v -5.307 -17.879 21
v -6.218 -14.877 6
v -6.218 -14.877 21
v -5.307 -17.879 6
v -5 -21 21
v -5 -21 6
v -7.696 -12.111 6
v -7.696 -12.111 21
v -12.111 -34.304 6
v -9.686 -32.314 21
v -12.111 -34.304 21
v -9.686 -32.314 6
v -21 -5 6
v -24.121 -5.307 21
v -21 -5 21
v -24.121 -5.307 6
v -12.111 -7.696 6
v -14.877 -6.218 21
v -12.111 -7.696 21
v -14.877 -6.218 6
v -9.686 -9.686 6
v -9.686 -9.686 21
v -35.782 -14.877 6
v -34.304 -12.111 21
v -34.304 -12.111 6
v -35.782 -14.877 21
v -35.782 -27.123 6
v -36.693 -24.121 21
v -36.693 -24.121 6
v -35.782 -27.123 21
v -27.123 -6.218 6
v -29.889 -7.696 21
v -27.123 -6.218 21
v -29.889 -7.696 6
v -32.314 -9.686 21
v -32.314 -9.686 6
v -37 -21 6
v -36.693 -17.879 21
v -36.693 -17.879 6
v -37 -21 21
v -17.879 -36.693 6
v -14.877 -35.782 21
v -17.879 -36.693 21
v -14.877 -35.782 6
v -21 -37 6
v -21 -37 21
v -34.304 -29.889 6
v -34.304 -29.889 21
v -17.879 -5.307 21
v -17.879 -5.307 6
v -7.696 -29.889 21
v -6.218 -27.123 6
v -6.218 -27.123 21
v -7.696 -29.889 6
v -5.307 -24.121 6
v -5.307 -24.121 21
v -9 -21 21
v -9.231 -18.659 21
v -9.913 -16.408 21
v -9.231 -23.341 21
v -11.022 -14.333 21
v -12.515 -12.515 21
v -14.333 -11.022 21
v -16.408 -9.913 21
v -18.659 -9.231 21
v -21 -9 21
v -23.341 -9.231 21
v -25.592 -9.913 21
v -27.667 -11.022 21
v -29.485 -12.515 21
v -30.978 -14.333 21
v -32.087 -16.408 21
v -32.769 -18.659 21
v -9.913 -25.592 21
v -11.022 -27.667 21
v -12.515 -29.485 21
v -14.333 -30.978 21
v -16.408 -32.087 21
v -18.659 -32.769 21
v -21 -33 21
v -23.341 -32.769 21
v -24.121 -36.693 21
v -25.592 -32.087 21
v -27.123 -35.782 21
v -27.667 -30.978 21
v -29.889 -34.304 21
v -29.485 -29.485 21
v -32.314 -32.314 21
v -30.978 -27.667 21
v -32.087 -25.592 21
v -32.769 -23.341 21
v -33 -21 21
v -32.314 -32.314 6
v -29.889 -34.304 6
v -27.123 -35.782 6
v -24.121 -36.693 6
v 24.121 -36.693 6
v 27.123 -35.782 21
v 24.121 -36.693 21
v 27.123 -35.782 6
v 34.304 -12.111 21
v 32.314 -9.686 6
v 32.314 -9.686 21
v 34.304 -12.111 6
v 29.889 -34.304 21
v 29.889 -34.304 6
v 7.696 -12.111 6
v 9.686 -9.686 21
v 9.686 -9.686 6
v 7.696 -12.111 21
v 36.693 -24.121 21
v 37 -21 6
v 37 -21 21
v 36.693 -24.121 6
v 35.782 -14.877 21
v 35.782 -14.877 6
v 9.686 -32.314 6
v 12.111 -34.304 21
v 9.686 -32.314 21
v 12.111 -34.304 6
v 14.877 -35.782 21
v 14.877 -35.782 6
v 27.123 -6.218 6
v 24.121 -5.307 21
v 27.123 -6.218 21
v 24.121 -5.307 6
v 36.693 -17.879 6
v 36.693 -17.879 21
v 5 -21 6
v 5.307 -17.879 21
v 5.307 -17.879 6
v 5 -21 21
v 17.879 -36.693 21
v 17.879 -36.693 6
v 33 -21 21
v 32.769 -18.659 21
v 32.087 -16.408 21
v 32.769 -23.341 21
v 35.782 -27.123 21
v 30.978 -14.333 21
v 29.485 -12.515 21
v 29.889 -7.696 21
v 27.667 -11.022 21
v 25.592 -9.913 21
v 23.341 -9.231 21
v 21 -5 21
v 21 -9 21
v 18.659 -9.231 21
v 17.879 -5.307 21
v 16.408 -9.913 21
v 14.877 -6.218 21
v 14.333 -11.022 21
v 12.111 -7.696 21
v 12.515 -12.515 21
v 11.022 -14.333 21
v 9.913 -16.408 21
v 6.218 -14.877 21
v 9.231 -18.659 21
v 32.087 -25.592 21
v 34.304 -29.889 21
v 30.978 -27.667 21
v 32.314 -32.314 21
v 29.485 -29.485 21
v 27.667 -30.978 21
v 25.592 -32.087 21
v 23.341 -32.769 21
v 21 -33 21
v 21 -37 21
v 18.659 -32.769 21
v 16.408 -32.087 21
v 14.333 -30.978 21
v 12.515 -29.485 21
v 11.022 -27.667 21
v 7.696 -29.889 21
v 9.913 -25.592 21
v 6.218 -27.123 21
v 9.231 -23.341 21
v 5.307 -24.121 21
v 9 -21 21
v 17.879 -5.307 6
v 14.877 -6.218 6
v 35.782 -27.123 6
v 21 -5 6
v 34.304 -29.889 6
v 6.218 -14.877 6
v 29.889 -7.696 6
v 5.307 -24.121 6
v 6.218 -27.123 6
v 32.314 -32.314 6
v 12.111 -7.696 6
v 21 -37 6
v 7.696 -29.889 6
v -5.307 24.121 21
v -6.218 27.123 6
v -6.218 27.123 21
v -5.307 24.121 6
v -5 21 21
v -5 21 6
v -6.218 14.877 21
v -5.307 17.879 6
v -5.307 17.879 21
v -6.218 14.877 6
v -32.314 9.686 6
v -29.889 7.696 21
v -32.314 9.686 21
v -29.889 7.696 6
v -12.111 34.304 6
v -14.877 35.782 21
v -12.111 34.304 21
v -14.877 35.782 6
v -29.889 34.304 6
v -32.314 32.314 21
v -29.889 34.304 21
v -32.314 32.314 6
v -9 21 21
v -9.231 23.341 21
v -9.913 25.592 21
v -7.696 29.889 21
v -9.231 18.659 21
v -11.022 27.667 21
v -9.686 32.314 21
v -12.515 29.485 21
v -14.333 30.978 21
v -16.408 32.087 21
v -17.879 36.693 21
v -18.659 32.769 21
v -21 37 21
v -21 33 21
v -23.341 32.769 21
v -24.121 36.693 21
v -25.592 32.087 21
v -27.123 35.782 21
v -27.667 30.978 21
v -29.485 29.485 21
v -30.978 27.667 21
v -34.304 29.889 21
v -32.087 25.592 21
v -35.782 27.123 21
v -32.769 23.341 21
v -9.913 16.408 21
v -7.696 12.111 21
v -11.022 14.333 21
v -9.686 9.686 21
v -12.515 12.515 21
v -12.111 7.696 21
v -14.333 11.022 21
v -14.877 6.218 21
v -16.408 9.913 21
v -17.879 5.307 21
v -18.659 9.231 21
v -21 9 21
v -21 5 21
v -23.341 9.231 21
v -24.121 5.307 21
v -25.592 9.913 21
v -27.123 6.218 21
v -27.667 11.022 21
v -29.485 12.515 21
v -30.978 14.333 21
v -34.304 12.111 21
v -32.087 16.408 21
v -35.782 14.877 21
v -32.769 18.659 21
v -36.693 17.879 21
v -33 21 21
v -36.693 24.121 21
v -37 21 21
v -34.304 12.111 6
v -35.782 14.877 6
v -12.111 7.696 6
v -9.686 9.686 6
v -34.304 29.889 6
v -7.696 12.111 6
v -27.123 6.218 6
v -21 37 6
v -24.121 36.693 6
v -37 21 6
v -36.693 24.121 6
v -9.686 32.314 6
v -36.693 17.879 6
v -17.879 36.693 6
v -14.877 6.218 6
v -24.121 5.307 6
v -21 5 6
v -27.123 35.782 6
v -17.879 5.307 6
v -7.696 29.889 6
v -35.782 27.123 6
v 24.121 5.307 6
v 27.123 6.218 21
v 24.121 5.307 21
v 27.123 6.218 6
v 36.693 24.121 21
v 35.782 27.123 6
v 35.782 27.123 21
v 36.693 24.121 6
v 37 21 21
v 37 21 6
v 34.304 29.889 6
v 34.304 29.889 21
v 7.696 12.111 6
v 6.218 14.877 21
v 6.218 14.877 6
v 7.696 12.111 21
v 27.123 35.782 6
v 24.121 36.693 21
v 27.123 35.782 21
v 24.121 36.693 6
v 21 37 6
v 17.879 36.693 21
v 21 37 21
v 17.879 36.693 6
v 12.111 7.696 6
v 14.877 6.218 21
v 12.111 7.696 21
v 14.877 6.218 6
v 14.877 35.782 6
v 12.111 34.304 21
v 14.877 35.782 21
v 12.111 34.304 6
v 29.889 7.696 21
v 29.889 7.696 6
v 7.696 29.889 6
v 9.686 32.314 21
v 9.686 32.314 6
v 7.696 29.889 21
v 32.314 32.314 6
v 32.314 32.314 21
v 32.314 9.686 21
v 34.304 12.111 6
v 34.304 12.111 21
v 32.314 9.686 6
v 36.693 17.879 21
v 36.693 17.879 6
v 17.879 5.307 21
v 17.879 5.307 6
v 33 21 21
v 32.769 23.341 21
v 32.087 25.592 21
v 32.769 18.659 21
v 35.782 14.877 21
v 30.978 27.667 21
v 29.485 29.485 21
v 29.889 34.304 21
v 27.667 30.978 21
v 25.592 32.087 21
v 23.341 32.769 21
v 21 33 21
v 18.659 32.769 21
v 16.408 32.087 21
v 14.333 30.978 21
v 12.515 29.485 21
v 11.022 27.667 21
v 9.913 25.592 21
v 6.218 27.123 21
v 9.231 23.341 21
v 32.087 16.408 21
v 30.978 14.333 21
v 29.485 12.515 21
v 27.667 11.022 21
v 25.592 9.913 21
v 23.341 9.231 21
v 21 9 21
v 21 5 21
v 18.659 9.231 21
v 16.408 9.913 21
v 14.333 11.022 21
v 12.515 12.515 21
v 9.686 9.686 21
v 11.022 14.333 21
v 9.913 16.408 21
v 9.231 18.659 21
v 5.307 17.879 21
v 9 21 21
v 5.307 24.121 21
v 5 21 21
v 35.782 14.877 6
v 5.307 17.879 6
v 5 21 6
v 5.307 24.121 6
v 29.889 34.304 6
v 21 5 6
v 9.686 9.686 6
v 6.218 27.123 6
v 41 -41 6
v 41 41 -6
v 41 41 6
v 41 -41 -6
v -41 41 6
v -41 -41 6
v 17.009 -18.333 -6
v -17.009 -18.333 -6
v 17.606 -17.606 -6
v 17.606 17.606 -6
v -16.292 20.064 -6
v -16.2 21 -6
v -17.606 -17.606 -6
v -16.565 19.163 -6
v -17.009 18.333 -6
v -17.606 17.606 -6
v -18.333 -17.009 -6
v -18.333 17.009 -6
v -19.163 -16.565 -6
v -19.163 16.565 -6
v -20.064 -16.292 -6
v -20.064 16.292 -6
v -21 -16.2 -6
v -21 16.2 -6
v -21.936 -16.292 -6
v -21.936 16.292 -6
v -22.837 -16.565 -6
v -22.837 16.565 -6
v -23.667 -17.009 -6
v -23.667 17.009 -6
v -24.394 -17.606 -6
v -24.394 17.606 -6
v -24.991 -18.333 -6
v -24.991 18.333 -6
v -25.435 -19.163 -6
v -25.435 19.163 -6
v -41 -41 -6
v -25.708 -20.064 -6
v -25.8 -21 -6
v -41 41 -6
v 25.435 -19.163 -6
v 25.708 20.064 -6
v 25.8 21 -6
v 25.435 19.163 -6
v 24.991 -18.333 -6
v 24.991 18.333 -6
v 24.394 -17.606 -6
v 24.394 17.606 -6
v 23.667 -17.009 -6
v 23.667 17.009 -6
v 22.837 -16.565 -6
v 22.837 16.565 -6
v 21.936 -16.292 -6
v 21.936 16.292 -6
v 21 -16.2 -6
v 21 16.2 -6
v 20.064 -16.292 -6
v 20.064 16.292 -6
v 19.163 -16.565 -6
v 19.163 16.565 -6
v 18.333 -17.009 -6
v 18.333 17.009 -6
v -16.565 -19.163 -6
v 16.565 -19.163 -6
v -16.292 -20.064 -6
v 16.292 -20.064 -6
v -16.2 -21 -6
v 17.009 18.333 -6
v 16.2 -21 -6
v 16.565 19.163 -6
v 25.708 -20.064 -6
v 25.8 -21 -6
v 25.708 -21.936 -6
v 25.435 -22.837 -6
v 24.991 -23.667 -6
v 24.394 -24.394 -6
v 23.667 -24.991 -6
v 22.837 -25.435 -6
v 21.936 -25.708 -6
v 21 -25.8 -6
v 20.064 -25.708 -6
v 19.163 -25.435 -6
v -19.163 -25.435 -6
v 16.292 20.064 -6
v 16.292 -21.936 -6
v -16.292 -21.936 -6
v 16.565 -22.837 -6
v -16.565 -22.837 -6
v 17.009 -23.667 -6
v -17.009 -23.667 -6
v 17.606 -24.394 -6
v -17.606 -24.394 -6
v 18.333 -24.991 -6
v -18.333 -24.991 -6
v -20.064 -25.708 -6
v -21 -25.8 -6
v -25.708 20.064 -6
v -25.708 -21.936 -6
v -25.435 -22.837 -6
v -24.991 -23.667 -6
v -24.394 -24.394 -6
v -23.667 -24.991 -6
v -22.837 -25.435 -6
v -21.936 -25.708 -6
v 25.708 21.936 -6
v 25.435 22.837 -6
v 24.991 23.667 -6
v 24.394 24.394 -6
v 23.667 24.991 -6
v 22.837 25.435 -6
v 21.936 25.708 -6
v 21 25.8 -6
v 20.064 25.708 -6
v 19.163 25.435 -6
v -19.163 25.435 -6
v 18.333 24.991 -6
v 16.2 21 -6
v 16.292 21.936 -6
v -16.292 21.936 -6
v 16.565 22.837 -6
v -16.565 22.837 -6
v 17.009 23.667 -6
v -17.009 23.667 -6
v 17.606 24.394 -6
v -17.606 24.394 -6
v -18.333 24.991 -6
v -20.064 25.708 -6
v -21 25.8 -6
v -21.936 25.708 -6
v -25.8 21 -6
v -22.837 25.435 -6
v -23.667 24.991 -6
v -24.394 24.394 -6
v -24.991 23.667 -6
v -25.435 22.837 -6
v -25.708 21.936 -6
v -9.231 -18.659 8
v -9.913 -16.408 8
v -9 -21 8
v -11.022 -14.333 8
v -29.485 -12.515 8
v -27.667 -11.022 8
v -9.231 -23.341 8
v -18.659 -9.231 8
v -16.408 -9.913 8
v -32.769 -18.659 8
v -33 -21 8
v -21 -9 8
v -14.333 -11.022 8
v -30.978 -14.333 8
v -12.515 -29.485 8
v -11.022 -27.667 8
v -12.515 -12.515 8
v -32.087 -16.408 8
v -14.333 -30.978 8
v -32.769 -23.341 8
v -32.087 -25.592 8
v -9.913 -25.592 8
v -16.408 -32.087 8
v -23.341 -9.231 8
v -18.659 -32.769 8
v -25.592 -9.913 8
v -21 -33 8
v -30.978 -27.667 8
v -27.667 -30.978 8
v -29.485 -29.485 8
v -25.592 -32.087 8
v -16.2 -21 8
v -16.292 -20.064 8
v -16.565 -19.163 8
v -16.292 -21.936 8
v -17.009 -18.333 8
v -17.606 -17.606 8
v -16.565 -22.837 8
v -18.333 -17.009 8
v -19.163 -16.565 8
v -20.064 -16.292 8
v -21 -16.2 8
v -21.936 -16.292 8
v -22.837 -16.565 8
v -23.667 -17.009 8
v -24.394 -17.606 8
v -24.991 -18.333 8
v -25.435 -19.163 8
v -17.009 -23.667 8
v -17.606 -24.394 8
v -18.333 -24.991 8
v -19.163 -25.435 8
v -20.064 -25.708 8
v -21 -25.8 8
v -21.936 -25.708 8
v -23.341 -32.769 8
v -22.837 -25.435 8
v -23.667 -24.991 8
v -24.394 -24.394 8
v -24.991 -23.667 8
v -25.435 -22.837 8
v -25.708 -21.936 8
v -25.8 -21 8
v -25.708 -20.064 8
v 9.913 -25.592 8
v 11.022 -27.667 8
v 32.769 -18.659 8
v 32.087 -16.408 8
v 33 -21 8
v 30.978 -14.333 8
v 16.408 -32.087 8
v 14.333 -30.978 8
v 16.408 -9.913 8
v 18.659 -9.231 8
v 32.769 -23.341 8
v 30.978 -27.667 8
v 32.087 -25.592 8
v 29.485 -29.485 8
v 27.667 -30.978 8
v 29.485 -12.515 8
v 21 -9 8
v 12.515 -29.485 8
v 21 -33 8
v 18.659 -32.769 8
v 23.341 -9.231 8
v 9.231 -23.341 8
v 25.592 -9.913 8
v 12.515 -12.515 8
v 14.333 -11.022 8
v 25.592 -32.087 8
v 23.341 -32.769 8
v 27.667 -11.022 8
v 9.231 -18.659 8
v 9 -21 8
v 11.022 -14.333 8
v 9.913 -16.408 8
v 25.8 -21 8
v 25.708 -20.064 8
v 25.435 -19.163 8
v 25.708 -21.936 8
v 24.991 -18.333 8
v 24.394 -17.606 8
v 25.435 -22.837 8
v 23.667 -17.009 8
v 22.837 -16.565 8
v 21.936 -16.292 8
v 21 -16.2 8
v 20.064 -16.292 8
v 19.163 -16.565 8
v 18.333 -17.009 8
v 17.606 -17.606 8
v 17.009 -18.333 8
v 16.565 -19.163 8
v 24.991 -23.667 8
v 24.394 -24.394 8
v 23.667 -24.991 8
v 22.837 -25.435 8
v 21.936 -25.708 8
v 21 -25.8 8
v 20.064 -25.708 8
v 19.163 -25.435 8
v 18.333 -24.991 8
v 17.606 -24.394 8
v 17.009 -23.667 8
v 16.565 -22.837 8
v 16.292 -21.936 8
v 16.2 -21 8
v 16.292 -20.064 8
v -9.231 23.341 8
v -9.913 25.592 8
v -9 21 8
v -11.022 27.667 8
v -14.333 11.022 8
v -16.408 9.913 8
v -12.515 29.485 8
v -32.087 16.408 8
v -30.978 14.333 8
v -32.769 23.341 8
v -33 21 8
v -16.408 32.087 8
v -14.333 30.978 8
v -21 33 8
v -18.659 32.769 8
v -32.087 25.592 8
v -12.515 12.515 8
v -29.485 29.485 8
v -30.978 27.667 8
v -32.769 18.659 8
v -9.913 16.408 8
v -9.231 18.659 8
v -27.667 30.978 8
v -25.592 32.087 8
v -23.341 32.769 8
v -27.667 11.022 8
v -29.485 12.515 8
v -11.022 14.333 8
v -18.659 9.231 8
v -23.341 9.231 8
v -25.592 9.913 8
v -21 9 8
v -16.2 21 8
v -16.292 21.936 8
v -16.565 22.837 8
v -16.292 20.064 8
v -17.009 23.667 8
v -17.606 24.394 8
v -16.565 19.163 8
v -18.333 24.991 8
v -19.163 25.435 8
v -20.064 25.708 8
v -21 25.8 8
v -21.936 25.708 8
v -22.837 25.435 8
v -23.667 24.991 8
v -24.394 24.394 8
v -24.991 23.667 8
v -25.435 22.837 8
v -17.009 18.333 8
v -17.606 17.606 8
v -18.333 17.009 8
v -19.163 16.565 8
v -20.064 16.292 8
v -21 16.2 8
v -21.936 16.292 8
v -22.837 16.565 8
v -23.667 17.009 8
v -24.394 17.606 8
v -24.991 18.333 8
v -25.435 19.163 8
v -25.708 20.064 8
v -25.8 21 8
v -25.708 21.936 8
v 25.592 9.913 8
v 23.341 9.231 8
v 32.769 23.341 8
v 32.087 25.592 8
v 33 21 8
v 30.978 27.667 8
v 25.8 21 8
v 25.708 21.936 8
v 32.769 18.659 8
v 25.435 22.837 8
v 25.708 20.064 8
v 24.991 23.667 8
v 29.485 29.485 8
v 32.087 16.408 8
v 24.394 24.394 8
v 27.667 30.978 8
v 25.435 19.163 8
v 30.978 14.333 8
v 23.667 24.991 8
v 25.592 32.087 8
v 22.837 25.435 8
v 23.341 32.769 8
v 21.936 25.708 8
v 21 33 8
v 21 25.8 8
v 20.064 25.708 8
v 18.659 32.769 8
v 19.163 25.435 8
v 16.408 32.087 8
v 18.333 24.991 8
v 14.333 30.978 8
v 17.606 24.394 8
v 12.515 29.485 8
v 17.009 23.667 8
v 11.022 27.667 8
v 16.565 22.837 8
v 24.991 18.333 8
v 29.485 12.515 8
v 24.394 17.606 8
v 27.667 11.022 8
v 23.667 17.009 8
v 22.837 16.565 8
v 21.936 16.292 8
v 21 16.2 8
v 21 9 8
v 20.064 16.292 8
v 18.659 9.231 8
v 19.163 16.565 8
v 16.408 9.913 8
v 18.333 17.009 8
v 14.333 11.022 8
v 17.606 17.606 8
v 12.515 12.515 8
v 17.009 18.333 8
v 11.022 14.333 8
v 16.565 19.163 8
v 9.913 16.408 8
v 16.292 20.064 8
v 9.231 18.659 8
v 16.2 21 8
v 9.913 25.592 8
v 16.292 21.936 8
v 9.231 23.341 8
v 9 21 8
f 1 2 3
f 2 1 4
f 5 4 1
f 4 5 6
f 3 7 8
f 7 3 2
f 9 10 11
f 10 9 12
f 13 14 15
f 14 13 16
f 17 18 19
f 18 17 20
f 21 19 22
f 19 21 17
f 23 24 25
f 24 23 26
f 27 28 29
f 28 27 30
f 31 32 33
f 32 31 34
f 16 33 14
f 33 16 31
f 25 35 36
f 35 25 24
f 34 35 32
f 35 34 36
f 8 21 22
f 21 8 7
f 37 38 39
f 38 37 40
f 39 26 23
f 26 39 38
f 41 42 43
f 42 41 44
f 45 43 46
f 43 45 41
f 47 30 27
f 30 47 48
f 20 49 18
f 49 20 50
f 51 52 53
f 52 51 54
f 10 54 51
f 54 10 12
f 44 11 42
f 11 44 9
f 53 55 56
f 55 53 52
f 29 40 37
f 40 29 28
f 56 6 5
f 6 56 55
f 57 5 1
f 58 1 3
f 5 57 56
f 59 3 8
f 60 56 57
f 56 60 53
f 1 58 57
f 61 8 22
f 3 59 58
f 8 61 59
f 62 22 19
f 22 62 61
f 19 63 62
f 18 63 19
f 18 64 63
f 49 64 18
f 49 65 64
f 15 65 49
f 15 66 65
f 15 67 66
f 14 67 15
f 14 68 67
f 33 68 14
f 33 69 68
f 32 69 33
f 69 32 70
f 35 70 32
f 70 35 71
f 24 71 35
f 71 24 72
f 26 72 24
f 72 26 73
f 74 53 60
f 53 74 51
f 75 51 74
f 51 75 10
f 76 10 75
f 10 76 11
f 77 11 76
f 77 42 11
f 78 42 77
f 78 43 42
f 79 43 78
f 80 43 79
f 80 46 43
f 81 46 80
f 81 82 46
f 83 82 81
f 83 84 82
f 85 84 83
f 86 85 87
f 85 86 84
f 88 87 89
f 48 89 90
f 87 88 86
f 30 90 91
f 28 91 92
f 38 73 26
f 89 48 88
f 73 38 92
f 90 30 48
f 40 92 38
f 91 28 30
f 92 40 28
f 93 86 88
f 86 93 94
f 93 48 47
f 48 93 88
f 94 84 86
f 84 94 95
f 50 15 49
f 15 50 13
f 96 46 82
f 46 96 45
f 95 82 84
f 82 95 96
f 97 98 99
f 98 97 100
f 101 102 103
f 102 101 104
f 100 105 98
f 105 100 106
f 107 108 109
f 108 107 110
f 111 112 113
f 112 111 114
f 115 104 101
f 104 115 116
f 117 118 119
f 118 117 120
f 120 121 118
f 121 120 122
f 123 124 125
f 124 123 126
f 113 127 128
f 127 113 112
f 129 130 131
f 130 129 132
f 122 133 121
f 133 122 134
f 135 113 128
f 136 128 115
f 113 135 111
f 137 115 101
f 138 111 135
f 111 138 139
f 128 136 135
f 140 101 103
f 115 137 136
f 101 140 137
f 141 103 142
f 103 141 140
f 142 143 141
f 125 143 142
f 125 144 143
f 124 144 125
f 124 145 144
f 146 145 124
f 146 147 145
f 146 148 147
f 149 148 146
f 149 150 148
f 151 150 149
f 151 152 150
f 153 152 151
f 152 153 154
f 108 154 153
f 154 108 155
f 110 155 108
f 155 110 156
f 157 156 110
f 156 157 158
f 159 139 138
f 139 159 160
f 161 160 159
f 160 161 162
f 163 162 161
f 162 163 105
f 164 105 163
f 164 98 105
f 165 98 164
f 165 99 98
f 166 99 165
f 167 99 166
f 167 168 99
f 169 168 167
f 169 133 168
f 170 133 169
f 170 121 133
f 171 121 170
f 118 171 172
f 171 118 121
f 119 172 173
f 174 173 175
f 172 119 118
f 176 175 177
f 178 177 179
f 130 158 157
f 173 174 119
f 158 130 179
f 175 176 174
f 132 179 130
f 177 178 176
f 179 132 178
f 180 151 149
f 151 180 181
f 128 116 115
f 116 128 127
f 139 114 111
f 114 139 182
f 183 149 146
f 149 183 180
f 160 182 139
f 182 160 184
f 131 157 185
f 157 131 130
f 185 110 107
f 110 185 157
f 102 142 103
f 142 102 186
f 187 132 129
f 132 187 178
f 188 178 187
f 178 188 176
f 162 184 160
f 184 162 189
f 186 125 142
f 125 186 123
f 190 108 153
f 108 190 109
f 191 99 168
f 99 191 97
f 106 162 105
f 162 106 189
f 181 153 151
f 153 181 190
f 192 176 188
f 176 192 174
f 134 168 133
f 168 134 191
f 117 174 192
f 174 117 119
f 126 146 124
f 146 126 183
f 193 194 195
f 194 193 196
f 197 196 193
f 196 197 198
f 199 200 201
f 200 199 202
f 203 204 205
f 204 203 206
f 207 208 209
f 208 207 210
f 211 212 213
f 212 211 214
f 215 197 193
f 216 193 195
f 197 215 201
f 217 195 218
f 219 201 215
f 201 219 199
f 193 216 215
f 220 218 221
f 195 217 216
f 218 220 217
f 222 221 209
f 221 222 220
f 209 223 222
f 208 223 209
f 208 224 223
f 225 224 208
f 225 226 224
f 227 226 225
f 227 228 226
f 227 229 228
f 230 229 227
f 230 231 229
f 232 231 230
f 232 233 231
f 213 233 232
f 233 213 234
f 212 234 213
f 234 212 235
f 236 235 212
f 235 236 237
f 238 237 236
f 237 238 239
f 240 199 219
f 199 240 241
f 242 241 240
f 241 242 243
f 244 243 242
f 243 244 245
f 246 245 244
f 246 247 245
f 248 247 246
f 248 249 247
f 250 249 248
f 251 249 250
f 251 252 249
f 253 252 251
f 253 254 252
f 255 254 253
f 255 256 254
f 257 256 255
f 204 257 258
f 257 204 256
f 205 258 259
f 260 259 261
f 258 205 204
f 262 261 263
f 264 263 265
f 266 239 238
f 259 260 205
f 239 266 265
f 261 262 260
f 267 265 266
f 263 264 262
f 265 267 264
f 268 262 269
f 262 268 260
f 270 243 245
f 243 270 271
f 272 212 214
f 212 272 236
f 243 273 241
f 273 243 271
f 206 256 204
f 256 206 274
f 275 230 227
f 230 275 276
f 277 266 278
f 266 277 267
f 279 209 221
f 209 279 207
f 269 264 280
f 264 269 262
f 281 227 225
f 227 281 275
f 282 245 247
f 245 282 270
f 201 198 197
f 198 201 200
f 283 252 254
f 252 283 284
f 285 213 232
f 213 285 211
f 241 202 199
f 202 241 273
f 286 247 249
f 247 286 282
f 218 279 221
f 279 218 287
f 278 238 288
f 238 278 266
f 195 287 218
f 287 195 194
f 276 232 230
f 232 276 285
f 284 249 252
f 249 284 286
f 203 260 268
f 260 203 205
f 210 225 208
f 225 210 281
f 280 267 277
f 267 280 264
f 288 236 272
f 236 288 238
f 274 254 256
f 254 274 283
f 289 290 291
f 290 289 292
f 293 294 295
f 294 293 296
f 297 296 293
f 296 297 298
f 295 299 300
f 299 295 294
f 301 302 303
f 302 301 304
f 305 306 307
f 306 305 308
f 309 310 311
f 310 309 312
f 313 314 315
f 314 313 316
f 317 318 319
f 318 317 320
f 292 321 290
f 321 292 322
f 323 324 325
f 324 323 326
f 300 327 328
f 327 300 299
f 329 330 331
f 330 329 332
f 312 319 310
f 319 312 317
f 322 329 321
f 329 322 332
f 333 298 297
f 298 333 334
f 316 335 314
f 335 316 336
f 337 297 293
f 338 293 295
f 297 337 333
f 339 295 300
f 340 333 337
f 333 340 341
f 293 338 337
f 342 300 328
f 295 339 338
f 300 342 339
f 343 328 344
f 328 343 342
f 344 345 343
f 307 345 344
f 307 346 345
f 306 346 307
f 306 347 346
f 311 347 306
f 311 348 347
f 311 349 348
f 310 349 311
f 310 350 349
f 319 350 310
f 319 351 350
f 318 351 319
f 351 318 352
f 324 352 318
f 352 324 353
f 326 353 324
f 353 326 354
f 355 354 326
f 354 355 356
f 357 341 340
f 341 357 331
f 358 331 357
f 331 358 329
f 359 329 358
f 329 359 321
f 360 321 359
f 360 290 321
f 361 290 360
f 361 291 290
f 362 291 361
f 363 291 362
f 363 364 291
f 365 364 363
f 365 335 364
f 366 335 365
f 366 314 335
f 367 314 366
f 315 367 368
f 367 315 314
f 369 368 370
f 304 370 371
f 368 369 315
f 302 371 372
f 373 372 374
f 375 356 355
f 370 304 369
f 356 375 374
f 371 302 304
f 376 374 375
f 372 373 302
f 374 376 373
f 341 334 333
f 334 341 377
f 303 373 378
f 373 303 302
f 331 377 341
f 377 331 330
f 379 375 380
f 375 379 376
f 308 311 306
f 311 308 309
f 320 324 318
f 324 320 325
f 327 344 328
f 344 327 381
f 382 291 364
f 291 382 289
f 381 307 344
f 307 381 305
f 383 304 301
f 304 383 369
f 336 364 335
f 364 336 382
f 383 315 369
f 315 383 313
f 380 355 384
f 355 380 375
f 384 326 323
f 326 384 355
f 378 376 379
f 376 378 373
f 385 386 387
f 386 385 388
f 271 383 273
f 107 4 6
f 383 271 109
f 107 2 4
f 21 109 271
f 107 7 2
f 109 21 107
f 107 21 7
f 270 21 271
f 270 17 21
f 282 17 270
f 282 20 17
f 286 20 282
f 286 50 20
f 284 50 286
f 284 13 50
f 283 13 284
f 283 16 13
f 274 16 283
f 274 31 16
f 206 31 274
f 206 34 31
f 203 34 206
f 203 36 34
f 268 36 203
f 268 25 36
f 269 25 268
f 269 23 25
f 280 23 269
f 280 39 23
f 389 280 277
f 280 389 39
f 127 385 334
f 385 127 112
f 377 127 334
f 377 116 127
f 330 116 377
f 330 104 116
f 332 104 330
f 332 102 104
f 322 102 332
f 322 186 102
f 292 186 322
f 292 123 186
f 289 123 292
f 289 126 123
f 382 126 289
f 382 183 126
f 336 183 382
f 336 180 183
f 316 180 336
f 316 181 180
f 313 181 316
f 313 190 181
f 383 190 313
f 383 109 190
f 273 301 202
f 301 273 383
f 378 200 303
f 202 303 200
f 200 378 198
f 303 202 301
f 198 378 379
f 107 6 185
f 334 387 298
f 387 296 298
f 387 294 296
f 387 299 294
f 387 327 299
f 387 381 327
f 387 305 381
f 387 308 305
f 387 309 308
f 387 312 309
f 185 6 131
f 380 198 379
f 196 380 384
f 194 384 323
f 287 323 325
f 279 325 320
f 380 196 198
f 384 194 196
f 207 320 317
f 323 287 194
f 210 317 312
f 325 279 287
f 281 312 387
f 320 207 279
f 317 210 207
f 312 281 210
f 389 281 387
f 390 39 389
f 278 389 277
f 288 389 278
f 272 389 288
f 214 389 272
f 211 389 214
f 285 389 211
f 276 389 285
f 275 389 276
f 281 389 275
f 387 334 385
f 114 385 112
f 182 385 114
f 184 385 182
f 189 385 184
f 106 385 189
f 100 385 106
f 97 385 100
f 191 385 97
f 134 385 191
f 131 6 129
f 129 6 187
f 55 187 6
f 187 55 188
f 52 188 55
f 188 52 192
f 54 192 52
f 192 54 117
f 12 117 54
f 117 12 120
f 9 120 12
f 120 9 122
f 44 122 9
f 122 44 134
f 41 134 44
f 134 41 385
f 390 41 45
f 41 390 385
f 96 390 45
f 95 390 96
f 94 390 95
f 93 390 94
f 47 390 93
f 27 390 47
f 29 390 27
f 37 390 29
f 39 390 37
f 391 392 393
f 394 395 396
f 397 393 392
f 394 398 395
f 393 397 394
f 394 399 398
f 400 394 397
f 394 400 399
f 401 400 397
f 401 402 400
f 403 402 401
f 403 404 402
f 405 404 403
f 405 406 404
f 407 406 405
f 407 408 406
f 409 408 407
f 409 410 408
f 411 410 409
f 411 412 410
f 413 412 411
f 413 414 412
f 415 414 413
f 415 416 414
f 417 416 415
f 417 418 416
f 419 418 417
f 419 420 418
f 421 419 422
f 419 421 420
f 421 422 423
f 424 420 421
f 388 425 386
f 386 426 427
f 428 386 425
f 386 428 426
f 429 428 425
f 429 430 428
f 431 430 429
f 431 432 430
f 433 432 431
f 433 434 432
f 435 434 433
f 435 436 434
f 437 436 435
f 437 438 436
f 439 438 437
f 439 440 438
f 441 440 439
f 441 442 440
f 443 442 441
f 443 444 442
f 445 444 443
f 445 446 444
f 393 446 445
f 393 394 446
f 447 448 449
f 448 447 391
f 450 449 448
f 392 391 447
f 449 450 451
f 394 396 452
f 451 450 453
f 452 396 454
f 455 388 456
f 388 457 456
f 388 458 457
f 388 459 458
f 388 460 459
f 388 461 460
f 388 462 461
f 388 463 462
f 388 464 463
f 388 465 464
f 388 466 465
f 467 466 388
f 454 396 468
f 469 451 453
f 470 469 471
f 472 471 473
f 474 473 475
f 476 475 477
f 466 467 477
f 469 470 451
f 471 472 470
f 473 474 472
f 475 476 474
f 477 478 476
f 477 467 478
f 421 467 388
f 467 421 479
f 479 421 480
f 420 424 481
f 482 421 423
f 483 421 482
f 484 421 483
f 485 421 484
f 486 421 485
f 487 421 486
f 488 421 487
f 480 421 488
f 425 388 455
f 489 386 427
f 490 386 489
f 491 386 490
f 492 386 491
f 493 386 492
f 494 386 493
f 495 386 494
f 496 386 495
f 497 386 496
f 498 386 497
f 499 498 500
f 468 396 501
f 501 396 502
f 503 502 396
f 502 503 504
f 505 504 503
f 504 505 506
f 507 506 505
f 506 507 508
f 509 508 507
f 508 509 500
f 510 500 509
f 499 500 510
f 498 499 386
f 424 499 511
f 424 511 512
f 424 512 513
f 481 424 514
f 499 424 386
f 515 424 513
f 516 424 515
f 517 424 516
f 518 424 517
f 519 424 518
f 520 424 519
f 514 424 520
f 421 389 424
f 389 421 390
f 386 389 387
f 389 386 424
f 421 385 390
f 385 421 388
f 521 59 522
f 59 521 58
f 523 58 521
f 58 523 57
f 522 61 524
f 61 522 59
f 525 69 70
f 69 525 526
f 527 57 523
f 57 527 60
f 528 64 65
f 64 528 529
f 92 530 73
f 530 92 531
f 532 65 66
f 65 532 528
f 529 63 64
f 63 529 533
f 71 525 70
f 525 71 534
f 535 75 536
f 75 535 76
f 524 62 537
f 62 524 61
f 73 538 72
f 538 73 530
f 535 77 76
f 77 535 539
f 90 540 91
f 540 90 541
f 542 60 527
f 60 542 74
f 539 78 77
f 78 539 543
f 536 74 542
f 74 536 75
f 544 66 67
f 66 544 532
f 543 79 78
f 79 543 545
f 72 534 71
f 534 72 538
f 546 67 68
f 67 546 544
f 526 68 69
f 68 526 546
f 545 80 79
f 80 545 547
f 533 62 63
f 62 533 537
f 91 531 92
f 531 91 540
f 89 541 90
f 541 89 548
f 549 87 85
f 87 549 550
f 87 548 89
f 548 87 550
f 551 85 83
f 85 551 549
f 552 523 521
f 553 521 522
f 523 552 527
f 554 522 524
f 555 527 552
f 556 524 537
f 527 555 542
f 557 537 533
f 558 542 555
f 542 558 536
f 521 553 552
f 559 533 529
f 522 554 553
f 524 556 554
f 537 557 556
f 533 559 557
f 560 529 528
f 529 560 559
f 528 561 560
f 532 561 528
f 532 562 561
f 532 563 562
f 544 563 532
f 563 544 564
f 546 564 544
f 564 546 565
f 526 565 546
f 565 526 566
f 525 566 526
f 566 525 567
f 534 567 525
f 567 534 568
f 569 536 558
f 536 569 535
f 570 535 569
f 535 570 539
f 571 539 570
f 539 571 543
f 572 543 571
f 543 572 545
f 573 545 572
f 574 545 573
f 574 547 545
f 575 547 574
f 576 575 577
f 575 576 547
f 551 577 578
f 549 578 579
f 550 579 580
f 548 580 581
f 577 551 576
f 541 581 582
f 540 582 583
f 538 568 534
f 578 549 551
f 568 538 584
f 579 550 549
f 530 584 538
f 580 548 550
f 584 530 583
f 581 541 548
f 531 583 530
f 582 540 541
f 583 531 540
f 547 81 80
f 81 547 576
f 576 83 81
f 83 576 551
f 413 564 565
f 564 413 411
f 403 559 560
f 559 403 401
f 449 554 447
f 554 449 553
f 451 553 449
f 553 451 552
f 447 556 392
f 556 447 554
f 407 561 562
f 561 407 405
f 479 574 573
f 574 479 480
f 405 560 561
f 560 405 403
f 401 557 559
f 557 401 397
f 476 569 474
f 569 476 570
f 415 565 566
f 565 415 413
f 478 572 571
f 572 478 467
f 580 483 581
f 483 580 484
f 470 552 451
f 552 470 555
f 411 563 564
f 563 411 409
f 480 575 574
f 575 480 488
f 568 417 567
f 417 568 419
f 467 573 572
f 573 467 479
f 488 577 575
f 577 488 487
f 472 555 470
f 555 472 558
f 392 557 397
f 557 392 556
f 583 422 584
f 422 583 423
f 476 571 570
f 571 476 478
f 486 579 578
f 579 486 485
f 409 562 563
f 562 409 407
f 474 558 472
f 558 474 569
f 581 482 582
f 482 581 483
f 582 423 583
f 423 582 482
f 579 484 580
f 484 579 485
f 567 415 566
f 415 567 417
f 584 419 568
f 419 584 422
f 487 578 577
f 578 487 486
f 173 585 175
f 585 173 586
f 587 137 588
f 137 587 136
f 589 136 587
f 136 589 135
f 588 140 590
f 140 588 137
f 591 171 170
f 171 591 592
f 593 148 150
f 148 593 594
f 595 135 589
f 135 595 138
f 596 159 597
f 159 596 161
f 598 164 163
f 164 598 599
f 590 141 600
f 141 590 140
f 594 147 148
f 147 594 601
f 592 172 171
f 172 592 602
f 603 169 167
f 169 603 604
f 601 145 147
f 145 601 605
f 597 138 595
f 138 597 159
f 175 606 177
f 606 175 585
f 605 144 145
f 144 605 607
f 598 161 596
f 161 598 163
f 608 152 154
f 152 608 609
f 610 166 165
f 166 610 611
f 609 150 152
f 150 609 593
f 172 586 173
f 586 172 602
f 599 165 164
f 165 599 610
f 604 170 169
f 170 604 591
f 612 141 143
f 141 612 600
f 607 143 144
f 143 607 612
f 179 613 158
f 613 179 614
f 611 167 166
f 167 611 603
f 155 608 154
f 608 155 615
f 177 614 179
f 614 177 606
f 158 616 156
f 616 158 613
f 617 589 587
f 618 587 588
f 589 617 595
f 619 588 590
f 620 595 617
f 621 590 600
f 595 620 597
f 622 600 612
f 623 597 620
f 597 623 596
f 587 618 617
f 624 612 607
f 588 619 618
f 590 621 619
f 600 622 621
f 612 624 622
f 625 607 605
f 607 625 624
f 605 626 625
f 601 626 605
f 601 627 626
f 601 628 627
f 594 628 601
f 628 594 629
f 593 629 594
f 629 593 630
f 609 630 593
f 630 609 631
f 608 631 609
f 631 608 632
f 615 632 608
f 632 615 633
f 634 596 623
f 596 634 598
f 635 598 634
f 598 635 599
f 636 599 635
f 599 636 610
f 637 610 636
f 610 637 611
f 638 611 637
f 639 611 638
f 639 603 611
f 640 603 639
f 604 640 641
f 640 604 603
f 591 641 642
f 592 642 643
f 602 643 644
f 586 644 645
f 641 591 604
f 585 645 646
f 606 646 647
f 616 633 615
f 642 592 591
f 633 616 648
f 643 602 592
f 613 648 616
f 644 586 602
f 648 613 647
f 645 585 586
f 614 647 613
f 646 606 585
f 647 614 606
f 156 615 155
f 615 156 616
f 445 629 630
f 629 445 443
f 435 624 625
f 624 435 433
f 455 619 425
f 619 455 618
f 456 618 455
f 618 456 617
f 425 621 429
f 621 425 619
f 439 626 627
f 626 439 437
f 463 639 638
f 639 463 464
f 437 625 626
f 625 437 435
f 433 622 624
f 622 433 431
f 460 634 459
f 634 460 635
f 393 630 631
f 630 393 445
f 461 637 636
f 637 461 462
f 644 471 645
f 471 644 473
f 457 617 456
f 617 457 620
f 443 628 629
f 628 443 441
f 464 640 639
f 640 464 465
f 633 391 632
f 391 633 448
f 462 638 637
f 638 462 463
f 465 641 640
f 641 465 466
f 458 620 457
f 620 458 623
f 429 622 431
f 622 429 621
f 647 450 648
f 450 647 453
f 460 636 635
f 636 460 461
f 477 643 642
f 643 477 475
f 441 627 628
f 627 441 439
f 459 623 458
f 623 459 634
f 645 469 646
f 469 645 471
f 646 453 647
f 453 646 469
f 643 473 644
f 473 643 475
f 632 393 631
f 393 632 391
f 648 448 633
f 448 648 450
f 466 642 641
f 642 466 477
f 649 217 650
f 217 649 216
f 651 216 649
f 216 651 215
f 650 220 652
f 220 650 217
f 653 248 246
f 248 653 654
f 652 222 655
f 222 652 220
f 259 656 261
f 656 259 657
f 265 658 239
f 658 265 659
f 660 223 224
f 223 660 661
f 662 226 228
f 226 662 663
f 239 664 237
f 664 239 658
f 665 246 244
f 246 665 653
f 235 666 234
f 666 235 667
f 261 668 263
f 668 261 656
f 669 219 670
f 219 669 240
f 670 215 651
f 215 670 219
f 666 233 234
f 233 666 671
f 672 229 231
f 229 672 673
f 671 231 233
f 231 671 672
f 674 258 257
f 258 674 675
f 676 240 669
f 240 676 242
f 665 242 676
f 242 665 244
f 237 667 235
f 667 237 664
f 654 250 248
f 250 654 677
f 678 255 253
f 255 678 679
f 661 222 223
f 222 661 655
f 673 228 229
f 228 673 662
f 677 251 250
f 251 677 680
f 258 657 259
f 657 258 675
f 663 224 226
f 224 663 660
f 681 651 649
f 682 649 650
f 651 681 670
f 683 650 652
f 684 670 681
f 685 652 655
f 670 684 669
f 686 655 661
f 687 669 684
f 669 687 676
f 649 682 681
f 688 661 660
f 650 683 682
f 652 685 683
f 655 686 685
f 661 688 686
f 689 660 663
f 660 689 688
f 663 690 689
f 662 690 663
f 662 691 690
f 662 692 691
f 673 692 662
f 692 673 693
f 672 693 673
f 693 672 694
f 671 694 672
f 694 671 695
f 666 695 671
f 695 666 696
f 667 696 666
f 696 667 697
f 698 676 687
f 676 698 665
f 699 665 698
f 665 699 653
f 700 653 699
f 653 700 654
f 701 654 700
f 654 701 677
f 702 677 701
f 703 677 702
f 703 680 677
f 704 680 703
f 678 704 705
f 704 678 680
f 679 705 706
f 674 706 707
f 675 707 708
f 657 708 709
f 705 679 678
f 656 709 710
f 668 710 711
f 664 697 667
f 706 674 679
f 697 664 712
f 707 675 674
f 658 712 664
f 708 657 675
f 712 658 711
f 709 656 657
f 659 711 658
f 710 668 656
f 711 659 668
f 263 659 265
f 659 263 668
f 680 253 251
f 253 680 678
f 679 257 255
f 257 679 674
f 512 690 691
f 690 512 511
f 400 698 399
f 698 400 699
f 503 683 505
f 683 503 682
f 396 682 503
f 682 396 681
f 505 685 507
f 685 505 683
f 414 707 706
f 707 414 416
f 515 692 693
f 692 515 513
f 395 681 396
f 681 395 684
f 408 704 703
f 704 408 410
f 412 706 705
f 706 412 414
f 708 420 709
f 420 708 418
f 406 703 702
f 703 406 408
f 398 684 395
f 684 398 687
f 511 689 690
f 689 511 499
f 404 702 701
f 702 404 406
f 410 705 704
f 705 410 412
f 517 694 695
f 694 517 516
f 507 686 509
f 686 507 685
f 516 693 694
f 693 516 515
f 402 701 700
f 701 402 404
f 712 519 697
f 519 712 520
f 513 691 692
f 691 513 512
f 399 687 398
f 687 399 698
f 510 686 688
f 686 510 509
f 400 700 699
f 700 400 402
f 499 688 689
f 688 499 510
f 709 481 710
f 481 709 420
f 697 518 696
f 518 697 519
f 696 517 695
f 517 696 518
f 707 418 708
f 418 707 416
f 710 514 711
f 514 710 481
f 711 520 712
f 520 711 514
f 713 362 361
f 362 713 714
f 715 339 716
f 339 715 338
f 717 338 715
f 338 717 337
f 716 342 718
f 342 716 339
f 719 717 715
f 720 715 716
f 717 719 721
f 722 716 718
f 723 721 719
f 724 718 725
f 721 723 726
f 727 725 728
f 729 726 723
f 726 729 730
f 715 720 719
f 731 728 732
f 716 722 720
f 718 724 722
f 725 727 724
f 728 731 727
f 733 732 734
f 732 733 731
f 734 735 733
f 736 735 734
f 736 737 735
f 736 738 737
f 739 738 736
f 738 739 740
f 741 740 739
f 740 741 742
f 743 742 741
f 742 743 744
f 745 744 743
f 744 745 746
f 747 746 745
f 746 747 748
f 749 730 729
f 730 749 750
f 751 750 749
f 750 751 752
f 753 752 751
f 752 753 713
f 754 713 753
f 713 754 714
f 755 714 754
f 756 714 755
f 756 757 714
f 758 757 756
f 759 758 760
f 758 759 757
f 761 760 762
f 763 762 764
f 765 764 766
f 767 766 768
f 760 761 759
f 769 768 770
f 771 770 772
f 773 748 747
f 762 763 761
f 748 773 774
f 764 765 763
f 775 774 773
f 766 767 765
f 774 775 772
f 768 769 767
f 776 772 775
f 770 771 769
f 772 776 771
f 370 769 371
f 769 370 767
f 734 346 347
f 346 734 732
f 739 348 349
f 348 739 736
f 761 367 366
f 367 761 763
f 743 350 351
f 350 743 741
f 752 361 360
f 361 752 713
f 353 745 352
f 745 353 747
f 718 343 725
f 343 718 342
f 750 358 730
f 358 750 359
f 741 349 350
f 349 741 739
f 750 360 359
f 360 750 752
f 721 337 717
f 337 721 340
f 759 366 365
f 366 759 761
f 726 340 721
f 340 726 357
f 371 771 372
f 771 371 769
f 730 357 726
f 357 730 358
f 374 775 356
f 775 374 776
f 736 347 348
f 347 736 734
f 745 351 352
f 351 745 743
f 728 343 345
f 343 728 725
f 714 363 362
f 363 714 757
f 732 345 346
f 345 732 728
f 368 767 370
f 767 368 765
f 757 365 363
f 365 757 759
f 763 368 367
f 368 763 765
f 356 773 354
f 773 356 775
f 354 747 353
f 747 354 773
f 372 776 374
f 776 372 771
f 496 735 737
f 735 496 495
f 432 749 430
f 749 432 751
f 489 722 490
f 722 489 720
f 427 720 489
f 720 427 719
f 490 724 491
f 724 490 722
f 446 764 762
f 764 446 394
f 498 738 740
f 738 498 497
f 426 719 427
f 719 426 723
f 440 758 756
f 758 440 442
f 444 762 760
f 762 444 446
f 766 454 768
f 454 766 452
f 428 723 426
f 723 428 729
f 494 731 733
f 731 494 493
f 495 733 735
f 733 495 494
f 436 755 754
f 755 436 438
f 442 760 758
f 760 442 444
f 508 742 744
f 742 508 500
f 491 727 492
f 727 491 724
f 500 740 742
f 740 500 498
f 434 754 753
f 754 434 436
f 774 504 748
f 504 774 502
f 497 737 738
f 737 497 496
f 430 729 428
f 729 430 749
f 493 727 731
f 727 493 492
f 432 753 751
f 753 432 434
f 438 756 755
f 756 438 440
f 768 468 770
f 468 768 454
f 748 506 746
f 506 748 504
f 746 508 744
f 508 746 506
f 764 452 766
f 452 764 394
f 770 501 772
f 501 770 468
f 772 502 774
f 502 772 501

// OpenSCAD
$fn = 32;

// ----------------------------------------------------------------------
// Socket pad plate
// bosses with counterbored sockets for the screws
// ----------------------------------------------------------------------

// --- parameters (mm) ---
base_t = 12;        // base plate thickness
boss_h = 15;        // boss height above the base plate
boss_d = 32;        // boss diameter
socket_d = 24;      // socket diameter
socket_depth = 13;  // socket depth from the boss face
bolt_d = 9.6;       // screw clearance hole through the socket floor
rows = 2;           // boss rows
cols = 2;           // bosses per row
pitch = 42;         // boss pitch

// --- derived feature positions (mm) ---
height = base_t + boss_h;           // = 27   overall height of the part
plate = [pitch * (cols - 1) + boss_d + 8, pitch * (rows - 1) + boss_d + 8, base_t];  // = [82, 82, 12]   overall size (x, y, z)
span_x = pitch * (cols - 1);        // = 42   distance between outer bosses
span_y = pitch * (rows - 1);        // = 42   distance between boss rows
origin_x = -span_x / 2;             // = -21   X of the first boss
origin_y = -span_y / 2;             // = -21   Y of the first boss
feature_centers = [
  [origin_x + 0 * pitch, origin_y + 0 * pitch],
  [origin_x + 1 * pitch, origin_y + 0 * pitch],
  [origin_x + 0 * pitch, origin_y + 1 * pitch],
  [origin_x + 1 * pitch, origin_y + 1 * pitch]
];   // boss centres: sockets, holes and the pads themselves are placed from here

// base plate, bosses on feature_centers, socket + through hole in each
difference() {
  union() {
    cube(plate, center = true);
    for (centre = feature_centers)
      translate([centre[0], centre[1], plate[2] / 2 - 1])
        cylinder(d = boss_d, h = boss_h + 1);
  }
  for (centre = feature_centers) {
    translate([centre[0], centre[1], plate[2] / 2 + boss_h - socket_depth])
      cylinder(d = socket_d, h = socket_depth + 1);
    translate([centre[0], centre[1], -height])
      cylinder(d = bolt_d, h = 2 * height + 2);  // through the socket floor
  }
}
